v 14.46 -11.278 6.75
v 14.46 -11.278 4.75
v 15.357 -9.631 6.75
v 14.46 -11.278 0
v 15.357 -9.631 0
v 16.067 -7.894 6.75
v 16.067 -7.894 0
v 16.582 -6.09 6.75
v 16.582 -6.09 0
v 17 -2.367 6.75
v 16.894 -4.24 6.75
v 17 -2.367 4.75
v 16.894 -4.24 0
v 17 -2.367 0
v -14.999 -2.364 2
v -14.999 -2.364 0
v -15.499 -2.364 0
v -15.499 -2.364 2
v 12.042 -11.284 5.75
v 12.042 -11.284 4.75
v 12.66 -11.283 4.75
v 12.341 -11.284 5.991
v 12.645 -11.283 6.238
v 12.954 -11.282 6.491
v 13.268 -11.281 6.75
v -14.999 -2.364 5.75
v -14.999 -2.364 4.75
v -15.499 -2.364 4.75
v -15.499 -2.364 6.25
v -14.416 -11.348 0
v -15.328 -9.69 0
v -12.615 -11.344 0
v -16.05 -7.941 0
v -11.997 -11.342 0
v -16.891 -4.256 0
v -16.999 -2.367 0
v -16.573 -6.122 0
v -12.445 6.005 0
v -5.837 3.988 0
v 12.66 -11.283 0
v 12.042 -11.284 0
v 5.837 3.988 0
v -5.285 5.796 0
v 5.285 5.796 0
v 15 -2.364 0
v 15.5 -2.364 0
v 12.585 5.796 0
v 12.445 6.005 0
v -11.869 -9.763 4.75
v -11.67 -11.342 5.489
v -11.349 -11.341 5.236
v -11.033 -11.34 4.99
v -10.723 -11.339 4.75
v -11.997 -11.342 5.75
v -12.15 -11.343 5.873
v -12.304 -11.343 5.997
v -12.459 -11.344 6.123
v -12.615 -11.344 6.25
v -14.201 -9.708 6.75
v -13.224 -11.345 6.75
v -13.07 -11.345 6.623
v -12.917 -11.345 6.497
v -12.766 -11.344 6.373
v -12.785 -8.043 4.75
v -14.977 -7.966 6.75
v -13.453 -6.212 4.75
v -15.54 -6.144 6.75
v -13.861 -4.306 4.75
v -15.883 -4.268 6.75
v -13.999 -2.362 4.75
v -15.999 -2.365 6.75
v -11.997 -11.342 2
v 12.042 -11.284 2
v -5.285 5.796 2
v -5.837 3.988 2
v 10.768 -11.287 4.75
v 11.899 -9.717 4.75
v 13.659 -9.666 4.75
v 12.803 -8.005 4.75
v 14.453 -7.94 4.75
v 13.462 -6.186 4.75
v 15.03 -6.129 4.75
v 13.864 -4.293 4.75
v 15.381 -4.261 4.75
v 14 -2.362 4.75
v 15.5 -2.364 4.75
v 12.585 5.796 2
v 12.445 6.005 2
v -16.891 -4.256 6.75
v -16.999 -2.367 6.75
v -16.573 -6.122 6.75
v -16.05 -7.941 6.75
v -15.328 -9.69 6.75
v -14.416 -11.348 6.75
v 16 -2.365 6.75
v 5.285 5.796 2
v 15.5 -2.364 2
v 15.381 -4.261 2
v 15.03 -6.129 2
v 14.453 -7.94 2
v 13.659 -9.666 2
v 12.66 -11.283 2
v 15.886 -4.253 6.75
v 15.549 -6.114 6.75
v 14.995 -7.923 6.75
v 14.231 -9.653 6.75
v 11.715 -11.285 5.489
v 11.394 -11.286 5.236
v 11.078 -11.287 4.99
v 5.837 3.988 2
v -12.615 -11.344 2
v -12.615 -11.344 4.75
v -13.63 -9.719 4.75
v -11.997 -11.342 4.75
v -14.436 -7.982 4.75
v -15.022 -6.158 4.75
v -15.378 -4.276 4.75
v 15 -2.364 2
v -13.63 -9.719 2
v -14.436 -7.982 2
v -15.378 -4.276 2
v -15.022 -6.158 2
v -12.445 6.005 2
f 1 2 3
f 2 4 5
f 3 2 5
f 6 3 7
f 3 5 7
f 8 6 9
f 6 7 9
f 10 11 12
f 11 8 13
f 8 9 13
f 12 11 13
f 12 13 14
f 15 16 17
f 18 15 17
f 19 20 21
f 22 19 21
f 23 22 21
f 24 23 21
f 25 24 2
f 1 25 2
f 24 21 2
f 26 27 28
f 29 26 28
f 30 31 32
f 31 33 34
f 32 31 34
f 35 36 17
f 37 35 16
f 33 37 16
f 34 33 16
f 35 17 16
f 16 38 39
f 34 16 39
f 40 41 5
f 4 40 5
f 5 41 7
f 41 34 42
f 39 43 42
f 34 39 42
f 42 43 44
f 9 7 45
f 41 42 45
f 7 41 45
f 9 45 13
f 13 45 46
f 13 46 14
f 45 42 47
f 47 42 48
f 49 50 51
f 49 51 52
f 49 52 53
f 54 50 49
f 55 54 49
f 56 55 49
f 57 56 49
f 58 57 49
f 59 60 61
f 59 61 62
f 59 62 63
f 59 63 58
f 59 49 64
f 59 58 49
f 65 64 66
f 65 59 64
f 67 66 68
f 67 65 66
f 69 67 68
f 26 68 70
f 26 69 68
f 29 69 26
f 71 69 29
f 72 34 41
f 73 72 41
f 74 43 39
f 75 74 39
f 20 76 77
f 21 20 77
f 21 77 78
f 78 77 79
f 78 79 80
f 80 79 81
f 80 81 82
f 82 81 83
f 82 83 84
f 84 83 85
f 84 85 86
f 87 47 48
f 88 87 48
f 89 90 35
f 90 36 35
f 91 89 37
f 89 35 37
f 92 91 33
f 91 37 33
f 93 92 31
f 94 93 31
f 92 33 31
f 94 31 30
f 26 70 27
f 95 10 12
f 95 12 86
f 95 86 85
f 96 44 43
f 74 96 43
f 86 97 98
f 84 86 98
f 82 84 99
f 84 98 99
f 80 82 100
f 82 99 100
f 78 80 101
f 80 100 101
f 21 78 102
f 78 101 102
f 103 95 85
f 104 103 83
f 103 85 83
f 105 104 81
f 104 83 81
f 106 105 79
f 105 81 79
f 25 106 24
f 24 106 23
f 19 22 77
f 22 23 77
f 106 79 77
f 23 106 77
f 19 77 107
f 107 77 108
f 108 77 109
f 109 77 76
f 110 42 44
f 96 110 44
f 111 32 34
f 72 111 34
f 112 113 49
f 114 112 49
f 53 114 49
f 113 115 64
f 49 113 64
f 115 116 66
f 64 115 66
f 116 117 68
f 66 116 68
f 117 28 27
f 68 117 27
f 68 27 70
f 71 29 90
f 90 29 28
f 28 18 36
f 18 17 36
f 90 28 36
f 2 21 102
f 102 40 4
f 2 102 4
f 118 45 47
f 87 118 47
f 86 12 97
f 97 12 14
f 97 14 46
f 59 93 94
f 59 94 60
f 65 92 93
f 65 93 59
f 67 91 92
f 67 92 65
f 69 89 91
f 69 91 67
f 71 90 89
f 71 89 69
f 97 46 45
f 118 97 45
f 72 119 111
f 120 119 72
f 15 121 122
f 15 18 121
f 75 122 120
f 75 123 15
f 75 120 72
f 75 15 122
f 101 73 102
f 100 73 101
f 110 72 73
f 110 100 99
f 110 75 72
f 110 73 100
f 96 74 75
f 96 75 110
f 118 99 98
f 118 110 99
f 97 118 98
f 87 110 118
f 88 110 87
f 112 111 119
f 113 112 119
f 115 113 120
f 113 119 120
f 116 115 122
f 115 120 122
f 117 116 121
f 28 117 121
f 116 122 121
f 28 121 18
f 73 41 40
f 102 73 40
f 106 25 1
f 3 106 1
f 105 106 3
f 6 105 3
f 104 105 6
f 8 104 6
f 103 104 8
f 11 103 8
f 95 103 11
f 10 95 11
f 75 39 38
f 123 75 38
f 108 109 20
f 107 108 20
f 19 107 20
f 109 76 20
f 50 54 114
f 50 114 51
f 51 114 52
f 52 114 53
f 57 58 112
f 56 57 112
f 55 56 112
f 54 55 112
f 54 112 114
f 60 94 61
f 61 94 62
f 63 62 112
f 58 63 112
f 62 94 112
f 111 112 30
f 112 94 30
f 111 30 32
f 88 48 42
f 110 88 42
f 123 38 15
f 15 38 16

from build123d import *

# Parameters (mm, degrees)
F2_DEPTH    = 2
F4_DEPTH    = 2.75
F6_DEPTH    = 2
F7_T2_ANGLE = 111.7162943046
F7_T4_ANGLE = 111.4349059649


# Not quite as in the source:
# - a fillet or chamfer that OpenCascade refuses, or shapes differently, is made with other operations: its cross-section is extruded or revolved along the edge and cut away or added


with BuildPart() as f2:
    # F1 (on Top) → F2 (new body)
    with BuildSketch(Plane.XY):
        with BuildLine():
            ThreePointArc((-12.615433857, -11.3439912447), (-14.7570217863, -7.0788626246), (-15.4994493417, -2.3643613435))
            Line((-15.4994493417, -2.3643613435), (-16.9994473669, -2.3667953738))
            ThreePointArc((-16.9994473669, -2.3667953738), (-16.3370166369, -7.0385981193), (-14.4159247362, -11.34835))
            Line((-14.4159247362, -11.34835), (-12.615433857, -11.3439912447))
        make_face()
        with BuildLine():
            ThreePointArc((-11.9969468723, -11.3424939678), (-14.2251992258, -7.0961265352), (-14.99945, -2.36355))
            Line((-14.99945, -2.36355), (-15.4994493417, -2.3643613435))
            ThreePointArc((-15.4994493417, -2.3643613435), (-14.7570217863, -7.0788626246), (-12.615433857, -11.3439912447))
            Line((-12.615433857, -11.3439912447), (-11.9969468723, -11.3424939678))
        make_face()
        with BuildLine():
            Line((-12.44455, 6.00525), (-14.99945, -2.36355))
            ThreePointArc((-14.99945, -2.36355), (-14.2251992258, -7.0961265352), (-11.9969468723, -11.3424939678))
            Line((-11.9969468723, -11.3424939678), (12.0415, -11.2843))
            ThreePointArc((12.0415, -11.2843), (14.2377010351, -7.0616579823), (15.00045, -2.36355))
            Line((15.00045, -2.36355), (12.58545, 5.79585))
            Line((12.58545, 5.79585), (12.44455, 6.00525))
            Line((12.44455, 6.00525), (5.8368961963, 3.9880080175))
            Line((5.8368961963, 3.9880080175), (5.2849824833, 5.79585))
            Line((5.2849824833, 5.79585), (0, 5.79585))
            Line((0, 5.79585), (-5.2849824833, 5.79585))
            Line((-5.2849824833, 5.79585), (-5.8368961963, 3.9880080175))
            Line((-5.8368961963, 3.9880080175), (-12.44455, 6.00525))
        make_face()
        with BuildLine():
            ThreePointArc((15.00045, -2.36355), (14.2377010351, -7.0616579823), (12.0415, -11.2843))
            Line((12.0415, -11.2843), (12.6599780988, -11.2828027446))
            ThreePointArc((12.6599780988, -11.2828027446), (14.7694777267, -7.043108573), (15.5004493418, -2.3643613211))
            Line((15.5004493418, -2.3643613211), (15.00045, -2.36355))
        make_face()
        with BuildLine():
            ThreePointArc((15.5004493418, -2.3643613211), (14.7694777267, -7.043108573), (12.6599780988, -11.2828027446))
            Line((12.6599780988, -11.2828027446), (14.4604487154, -11.2784440383))
            ThreePointArc((14.4604487154, -11.2784440383), (16.3493648109, -6.9990233555), (17.000447367, -2.3667952845))
            Line((17.000447367, -2.3667952845), (15.5004493418, -2.3643613211))
        make_face()
    extrude(amount=F2_DEPTH)

    # F3 (on face) → F4 (join)
    with BuildSketch(Plane.XY.offset(2)):
        with BuildLine():
            ThreePointArc((-12.615433857, -11.3439912447), (-14.7570217863, -7.0788626246), (-15.4994493417, -2.3643613435))
            Line((-15.4994493417, -2.3643613435), (-16.9994473669, -2.3667953738))
            ThreePointArc((-16.9994473669, -2.3667953738), (-16.3370166369, -7.0385981193), (-14.4159247362, -11.34835))
            Line((-14.4159247362, -11.34835), (-12.615433857, -11.3439912447))
        make_face()
        with BuildLine():
            ThreePointArc((15.5004493418, -2.3643613211), (14.7694777267, -7.043108573), (12.6599780988, -11.2828027446))
            Line((12.6599780988, -11.2828027446), (14.4604487154, -11.2784440383))
            ThreePointArc((14.4604487154, -11.2784440383), (16.3493648109, -6.9990233555), (17.000447367, -2.3667952845))
            Line((17.000447367, -2.3667952845), (15.5004493418, -2.3643613211))
        make_face()
    extrude(amount=F4_DEPTH)

    # F5 (on face) → F6 (join)
    with BuildSketch(Plane.XY.offset(4.75)):
        with BuildLine():
            ThreePointArc((-11.9969468723, -11.3424939678), (-14.2251992258, -7.0961265352), (-14.99945, -2.36355))
            Line((-14.99945, -2.36355), (-15.4994493417, -2.3643613435))
            ThreePointArc((-15.4994493417, -2.3643613435), (-14.7570217863, -7.0788626246), (-12.615433857, -11.3439912447))
            Line((-12.615433857, -11.3439912447), (-11.9969468723, -11.3424939678))
        make_face()
        with BuildLine():
            ThreePointArc((-12.615433857, -11.3439912447), (-14.7570217863, -7.0788626246), (-15.4994493417, -2.3643613435))
            Line((-15.4994493417, -2.3643613435), (-16.9994473669, -2.3667953738))
            ThreePointArc((-16.9994473669, -2.3667953738), (-16.3370166369, -7.0385981193), (-14.4159247362, -11.34835))
            Line((-14.4159247362, -11.34835), (-12.615433857, -11.3439912447))
        make_face()
        with BuildLine():
            Line((-12.9994526331, -2.3603046262), (-14.99945, -2.36355))
            ThreePointArc((-14.99945, -2.36355), (-14.2251992258, -7.0961265352), (-11.9969468723, -11.3424939678))
            Line((-11.9969468723, -11.3424939678), (-9.3831293237, -11.3361662539))
            ThreePointArc((-9.3831293237, -11.3361662539), (-12.0576120471, -7.1972712434), (-12.9994526331, -2.3603046262))
        make_face()
        with BuildLine():
            ThreePointArc((13.000452633, -2.3603047155), (12.0703811691, -7.1680366652), (9.4277378752, -11.2906275797))
            Line((9.4277378752, -11.2906275797), (12.0415, -11.2843))
            ThreePointArc((12.0415, -11.2843), (14.2377010351, -7.0616579823), (15.00045, -2.36355))
            Line((15.00045, -2.36355), (13.000452633, -2.3603047155))
        make_face()
        with BuildLine():
            ThreePointArc((15.00045, -2.36355), (14.2377010351, -7.0616579823), (12.0415, -11.2843))
            Line((12.0415, -11.2843), (14.4604487154, -11.2784440383))
            ThreePointArc((14.4604487154, -11.2784440383), (16.3493648109, -6.9990233555), (17.000447367, -2.3667952845))
            Line((17.000447367, -2.3667952845), (15.00045, -2.36355))
        make_face()
    extrude(amount=F6_DEPTH)

    # F7: chamfer of 3 on 2 edges, made by hand

    # F7_s1 → F7_t2 (revolve, cut)
    with BuildSketch(Plane(origin=(0.4833612439, -0.1044854652, 0), x_dir=(0, 0, 1), z_dir=(0.9774246375, -0.2112843535, 0))):
        Polygon((3.75, 15.2861027758), (6.75, 18.2861027758), (6.75, 15.2861027758), align=None)
    revolve(axis=Axis((0.0002934681, -2.3392100804, 6.75), (0, 0, -1)), revolution_arc=F7_T2_ANGLE, mode=Mode.SUBTRACT)

    # F7_s3 → F7_t4 (revolve, cut)
    with BuildSketch(Plane(origin=(1.0831916717, -1.6111813469, 0), x_dir=(0, 0, 1), z_dir=(-0.5579305881, 0.8298876182, 0))):
        Polygon((6.75, 14.695302969), (3.75, 11.695302969), (6.75, 11.695302969), align=None)
    revolve(axis=Axis((0.0002934681, -2.3392100804, 6.75), (0, 0, -1)), revolution_arc=F7_T4_ANGLE, mode=Mode.SUBTRACT)


solid = f2.part
